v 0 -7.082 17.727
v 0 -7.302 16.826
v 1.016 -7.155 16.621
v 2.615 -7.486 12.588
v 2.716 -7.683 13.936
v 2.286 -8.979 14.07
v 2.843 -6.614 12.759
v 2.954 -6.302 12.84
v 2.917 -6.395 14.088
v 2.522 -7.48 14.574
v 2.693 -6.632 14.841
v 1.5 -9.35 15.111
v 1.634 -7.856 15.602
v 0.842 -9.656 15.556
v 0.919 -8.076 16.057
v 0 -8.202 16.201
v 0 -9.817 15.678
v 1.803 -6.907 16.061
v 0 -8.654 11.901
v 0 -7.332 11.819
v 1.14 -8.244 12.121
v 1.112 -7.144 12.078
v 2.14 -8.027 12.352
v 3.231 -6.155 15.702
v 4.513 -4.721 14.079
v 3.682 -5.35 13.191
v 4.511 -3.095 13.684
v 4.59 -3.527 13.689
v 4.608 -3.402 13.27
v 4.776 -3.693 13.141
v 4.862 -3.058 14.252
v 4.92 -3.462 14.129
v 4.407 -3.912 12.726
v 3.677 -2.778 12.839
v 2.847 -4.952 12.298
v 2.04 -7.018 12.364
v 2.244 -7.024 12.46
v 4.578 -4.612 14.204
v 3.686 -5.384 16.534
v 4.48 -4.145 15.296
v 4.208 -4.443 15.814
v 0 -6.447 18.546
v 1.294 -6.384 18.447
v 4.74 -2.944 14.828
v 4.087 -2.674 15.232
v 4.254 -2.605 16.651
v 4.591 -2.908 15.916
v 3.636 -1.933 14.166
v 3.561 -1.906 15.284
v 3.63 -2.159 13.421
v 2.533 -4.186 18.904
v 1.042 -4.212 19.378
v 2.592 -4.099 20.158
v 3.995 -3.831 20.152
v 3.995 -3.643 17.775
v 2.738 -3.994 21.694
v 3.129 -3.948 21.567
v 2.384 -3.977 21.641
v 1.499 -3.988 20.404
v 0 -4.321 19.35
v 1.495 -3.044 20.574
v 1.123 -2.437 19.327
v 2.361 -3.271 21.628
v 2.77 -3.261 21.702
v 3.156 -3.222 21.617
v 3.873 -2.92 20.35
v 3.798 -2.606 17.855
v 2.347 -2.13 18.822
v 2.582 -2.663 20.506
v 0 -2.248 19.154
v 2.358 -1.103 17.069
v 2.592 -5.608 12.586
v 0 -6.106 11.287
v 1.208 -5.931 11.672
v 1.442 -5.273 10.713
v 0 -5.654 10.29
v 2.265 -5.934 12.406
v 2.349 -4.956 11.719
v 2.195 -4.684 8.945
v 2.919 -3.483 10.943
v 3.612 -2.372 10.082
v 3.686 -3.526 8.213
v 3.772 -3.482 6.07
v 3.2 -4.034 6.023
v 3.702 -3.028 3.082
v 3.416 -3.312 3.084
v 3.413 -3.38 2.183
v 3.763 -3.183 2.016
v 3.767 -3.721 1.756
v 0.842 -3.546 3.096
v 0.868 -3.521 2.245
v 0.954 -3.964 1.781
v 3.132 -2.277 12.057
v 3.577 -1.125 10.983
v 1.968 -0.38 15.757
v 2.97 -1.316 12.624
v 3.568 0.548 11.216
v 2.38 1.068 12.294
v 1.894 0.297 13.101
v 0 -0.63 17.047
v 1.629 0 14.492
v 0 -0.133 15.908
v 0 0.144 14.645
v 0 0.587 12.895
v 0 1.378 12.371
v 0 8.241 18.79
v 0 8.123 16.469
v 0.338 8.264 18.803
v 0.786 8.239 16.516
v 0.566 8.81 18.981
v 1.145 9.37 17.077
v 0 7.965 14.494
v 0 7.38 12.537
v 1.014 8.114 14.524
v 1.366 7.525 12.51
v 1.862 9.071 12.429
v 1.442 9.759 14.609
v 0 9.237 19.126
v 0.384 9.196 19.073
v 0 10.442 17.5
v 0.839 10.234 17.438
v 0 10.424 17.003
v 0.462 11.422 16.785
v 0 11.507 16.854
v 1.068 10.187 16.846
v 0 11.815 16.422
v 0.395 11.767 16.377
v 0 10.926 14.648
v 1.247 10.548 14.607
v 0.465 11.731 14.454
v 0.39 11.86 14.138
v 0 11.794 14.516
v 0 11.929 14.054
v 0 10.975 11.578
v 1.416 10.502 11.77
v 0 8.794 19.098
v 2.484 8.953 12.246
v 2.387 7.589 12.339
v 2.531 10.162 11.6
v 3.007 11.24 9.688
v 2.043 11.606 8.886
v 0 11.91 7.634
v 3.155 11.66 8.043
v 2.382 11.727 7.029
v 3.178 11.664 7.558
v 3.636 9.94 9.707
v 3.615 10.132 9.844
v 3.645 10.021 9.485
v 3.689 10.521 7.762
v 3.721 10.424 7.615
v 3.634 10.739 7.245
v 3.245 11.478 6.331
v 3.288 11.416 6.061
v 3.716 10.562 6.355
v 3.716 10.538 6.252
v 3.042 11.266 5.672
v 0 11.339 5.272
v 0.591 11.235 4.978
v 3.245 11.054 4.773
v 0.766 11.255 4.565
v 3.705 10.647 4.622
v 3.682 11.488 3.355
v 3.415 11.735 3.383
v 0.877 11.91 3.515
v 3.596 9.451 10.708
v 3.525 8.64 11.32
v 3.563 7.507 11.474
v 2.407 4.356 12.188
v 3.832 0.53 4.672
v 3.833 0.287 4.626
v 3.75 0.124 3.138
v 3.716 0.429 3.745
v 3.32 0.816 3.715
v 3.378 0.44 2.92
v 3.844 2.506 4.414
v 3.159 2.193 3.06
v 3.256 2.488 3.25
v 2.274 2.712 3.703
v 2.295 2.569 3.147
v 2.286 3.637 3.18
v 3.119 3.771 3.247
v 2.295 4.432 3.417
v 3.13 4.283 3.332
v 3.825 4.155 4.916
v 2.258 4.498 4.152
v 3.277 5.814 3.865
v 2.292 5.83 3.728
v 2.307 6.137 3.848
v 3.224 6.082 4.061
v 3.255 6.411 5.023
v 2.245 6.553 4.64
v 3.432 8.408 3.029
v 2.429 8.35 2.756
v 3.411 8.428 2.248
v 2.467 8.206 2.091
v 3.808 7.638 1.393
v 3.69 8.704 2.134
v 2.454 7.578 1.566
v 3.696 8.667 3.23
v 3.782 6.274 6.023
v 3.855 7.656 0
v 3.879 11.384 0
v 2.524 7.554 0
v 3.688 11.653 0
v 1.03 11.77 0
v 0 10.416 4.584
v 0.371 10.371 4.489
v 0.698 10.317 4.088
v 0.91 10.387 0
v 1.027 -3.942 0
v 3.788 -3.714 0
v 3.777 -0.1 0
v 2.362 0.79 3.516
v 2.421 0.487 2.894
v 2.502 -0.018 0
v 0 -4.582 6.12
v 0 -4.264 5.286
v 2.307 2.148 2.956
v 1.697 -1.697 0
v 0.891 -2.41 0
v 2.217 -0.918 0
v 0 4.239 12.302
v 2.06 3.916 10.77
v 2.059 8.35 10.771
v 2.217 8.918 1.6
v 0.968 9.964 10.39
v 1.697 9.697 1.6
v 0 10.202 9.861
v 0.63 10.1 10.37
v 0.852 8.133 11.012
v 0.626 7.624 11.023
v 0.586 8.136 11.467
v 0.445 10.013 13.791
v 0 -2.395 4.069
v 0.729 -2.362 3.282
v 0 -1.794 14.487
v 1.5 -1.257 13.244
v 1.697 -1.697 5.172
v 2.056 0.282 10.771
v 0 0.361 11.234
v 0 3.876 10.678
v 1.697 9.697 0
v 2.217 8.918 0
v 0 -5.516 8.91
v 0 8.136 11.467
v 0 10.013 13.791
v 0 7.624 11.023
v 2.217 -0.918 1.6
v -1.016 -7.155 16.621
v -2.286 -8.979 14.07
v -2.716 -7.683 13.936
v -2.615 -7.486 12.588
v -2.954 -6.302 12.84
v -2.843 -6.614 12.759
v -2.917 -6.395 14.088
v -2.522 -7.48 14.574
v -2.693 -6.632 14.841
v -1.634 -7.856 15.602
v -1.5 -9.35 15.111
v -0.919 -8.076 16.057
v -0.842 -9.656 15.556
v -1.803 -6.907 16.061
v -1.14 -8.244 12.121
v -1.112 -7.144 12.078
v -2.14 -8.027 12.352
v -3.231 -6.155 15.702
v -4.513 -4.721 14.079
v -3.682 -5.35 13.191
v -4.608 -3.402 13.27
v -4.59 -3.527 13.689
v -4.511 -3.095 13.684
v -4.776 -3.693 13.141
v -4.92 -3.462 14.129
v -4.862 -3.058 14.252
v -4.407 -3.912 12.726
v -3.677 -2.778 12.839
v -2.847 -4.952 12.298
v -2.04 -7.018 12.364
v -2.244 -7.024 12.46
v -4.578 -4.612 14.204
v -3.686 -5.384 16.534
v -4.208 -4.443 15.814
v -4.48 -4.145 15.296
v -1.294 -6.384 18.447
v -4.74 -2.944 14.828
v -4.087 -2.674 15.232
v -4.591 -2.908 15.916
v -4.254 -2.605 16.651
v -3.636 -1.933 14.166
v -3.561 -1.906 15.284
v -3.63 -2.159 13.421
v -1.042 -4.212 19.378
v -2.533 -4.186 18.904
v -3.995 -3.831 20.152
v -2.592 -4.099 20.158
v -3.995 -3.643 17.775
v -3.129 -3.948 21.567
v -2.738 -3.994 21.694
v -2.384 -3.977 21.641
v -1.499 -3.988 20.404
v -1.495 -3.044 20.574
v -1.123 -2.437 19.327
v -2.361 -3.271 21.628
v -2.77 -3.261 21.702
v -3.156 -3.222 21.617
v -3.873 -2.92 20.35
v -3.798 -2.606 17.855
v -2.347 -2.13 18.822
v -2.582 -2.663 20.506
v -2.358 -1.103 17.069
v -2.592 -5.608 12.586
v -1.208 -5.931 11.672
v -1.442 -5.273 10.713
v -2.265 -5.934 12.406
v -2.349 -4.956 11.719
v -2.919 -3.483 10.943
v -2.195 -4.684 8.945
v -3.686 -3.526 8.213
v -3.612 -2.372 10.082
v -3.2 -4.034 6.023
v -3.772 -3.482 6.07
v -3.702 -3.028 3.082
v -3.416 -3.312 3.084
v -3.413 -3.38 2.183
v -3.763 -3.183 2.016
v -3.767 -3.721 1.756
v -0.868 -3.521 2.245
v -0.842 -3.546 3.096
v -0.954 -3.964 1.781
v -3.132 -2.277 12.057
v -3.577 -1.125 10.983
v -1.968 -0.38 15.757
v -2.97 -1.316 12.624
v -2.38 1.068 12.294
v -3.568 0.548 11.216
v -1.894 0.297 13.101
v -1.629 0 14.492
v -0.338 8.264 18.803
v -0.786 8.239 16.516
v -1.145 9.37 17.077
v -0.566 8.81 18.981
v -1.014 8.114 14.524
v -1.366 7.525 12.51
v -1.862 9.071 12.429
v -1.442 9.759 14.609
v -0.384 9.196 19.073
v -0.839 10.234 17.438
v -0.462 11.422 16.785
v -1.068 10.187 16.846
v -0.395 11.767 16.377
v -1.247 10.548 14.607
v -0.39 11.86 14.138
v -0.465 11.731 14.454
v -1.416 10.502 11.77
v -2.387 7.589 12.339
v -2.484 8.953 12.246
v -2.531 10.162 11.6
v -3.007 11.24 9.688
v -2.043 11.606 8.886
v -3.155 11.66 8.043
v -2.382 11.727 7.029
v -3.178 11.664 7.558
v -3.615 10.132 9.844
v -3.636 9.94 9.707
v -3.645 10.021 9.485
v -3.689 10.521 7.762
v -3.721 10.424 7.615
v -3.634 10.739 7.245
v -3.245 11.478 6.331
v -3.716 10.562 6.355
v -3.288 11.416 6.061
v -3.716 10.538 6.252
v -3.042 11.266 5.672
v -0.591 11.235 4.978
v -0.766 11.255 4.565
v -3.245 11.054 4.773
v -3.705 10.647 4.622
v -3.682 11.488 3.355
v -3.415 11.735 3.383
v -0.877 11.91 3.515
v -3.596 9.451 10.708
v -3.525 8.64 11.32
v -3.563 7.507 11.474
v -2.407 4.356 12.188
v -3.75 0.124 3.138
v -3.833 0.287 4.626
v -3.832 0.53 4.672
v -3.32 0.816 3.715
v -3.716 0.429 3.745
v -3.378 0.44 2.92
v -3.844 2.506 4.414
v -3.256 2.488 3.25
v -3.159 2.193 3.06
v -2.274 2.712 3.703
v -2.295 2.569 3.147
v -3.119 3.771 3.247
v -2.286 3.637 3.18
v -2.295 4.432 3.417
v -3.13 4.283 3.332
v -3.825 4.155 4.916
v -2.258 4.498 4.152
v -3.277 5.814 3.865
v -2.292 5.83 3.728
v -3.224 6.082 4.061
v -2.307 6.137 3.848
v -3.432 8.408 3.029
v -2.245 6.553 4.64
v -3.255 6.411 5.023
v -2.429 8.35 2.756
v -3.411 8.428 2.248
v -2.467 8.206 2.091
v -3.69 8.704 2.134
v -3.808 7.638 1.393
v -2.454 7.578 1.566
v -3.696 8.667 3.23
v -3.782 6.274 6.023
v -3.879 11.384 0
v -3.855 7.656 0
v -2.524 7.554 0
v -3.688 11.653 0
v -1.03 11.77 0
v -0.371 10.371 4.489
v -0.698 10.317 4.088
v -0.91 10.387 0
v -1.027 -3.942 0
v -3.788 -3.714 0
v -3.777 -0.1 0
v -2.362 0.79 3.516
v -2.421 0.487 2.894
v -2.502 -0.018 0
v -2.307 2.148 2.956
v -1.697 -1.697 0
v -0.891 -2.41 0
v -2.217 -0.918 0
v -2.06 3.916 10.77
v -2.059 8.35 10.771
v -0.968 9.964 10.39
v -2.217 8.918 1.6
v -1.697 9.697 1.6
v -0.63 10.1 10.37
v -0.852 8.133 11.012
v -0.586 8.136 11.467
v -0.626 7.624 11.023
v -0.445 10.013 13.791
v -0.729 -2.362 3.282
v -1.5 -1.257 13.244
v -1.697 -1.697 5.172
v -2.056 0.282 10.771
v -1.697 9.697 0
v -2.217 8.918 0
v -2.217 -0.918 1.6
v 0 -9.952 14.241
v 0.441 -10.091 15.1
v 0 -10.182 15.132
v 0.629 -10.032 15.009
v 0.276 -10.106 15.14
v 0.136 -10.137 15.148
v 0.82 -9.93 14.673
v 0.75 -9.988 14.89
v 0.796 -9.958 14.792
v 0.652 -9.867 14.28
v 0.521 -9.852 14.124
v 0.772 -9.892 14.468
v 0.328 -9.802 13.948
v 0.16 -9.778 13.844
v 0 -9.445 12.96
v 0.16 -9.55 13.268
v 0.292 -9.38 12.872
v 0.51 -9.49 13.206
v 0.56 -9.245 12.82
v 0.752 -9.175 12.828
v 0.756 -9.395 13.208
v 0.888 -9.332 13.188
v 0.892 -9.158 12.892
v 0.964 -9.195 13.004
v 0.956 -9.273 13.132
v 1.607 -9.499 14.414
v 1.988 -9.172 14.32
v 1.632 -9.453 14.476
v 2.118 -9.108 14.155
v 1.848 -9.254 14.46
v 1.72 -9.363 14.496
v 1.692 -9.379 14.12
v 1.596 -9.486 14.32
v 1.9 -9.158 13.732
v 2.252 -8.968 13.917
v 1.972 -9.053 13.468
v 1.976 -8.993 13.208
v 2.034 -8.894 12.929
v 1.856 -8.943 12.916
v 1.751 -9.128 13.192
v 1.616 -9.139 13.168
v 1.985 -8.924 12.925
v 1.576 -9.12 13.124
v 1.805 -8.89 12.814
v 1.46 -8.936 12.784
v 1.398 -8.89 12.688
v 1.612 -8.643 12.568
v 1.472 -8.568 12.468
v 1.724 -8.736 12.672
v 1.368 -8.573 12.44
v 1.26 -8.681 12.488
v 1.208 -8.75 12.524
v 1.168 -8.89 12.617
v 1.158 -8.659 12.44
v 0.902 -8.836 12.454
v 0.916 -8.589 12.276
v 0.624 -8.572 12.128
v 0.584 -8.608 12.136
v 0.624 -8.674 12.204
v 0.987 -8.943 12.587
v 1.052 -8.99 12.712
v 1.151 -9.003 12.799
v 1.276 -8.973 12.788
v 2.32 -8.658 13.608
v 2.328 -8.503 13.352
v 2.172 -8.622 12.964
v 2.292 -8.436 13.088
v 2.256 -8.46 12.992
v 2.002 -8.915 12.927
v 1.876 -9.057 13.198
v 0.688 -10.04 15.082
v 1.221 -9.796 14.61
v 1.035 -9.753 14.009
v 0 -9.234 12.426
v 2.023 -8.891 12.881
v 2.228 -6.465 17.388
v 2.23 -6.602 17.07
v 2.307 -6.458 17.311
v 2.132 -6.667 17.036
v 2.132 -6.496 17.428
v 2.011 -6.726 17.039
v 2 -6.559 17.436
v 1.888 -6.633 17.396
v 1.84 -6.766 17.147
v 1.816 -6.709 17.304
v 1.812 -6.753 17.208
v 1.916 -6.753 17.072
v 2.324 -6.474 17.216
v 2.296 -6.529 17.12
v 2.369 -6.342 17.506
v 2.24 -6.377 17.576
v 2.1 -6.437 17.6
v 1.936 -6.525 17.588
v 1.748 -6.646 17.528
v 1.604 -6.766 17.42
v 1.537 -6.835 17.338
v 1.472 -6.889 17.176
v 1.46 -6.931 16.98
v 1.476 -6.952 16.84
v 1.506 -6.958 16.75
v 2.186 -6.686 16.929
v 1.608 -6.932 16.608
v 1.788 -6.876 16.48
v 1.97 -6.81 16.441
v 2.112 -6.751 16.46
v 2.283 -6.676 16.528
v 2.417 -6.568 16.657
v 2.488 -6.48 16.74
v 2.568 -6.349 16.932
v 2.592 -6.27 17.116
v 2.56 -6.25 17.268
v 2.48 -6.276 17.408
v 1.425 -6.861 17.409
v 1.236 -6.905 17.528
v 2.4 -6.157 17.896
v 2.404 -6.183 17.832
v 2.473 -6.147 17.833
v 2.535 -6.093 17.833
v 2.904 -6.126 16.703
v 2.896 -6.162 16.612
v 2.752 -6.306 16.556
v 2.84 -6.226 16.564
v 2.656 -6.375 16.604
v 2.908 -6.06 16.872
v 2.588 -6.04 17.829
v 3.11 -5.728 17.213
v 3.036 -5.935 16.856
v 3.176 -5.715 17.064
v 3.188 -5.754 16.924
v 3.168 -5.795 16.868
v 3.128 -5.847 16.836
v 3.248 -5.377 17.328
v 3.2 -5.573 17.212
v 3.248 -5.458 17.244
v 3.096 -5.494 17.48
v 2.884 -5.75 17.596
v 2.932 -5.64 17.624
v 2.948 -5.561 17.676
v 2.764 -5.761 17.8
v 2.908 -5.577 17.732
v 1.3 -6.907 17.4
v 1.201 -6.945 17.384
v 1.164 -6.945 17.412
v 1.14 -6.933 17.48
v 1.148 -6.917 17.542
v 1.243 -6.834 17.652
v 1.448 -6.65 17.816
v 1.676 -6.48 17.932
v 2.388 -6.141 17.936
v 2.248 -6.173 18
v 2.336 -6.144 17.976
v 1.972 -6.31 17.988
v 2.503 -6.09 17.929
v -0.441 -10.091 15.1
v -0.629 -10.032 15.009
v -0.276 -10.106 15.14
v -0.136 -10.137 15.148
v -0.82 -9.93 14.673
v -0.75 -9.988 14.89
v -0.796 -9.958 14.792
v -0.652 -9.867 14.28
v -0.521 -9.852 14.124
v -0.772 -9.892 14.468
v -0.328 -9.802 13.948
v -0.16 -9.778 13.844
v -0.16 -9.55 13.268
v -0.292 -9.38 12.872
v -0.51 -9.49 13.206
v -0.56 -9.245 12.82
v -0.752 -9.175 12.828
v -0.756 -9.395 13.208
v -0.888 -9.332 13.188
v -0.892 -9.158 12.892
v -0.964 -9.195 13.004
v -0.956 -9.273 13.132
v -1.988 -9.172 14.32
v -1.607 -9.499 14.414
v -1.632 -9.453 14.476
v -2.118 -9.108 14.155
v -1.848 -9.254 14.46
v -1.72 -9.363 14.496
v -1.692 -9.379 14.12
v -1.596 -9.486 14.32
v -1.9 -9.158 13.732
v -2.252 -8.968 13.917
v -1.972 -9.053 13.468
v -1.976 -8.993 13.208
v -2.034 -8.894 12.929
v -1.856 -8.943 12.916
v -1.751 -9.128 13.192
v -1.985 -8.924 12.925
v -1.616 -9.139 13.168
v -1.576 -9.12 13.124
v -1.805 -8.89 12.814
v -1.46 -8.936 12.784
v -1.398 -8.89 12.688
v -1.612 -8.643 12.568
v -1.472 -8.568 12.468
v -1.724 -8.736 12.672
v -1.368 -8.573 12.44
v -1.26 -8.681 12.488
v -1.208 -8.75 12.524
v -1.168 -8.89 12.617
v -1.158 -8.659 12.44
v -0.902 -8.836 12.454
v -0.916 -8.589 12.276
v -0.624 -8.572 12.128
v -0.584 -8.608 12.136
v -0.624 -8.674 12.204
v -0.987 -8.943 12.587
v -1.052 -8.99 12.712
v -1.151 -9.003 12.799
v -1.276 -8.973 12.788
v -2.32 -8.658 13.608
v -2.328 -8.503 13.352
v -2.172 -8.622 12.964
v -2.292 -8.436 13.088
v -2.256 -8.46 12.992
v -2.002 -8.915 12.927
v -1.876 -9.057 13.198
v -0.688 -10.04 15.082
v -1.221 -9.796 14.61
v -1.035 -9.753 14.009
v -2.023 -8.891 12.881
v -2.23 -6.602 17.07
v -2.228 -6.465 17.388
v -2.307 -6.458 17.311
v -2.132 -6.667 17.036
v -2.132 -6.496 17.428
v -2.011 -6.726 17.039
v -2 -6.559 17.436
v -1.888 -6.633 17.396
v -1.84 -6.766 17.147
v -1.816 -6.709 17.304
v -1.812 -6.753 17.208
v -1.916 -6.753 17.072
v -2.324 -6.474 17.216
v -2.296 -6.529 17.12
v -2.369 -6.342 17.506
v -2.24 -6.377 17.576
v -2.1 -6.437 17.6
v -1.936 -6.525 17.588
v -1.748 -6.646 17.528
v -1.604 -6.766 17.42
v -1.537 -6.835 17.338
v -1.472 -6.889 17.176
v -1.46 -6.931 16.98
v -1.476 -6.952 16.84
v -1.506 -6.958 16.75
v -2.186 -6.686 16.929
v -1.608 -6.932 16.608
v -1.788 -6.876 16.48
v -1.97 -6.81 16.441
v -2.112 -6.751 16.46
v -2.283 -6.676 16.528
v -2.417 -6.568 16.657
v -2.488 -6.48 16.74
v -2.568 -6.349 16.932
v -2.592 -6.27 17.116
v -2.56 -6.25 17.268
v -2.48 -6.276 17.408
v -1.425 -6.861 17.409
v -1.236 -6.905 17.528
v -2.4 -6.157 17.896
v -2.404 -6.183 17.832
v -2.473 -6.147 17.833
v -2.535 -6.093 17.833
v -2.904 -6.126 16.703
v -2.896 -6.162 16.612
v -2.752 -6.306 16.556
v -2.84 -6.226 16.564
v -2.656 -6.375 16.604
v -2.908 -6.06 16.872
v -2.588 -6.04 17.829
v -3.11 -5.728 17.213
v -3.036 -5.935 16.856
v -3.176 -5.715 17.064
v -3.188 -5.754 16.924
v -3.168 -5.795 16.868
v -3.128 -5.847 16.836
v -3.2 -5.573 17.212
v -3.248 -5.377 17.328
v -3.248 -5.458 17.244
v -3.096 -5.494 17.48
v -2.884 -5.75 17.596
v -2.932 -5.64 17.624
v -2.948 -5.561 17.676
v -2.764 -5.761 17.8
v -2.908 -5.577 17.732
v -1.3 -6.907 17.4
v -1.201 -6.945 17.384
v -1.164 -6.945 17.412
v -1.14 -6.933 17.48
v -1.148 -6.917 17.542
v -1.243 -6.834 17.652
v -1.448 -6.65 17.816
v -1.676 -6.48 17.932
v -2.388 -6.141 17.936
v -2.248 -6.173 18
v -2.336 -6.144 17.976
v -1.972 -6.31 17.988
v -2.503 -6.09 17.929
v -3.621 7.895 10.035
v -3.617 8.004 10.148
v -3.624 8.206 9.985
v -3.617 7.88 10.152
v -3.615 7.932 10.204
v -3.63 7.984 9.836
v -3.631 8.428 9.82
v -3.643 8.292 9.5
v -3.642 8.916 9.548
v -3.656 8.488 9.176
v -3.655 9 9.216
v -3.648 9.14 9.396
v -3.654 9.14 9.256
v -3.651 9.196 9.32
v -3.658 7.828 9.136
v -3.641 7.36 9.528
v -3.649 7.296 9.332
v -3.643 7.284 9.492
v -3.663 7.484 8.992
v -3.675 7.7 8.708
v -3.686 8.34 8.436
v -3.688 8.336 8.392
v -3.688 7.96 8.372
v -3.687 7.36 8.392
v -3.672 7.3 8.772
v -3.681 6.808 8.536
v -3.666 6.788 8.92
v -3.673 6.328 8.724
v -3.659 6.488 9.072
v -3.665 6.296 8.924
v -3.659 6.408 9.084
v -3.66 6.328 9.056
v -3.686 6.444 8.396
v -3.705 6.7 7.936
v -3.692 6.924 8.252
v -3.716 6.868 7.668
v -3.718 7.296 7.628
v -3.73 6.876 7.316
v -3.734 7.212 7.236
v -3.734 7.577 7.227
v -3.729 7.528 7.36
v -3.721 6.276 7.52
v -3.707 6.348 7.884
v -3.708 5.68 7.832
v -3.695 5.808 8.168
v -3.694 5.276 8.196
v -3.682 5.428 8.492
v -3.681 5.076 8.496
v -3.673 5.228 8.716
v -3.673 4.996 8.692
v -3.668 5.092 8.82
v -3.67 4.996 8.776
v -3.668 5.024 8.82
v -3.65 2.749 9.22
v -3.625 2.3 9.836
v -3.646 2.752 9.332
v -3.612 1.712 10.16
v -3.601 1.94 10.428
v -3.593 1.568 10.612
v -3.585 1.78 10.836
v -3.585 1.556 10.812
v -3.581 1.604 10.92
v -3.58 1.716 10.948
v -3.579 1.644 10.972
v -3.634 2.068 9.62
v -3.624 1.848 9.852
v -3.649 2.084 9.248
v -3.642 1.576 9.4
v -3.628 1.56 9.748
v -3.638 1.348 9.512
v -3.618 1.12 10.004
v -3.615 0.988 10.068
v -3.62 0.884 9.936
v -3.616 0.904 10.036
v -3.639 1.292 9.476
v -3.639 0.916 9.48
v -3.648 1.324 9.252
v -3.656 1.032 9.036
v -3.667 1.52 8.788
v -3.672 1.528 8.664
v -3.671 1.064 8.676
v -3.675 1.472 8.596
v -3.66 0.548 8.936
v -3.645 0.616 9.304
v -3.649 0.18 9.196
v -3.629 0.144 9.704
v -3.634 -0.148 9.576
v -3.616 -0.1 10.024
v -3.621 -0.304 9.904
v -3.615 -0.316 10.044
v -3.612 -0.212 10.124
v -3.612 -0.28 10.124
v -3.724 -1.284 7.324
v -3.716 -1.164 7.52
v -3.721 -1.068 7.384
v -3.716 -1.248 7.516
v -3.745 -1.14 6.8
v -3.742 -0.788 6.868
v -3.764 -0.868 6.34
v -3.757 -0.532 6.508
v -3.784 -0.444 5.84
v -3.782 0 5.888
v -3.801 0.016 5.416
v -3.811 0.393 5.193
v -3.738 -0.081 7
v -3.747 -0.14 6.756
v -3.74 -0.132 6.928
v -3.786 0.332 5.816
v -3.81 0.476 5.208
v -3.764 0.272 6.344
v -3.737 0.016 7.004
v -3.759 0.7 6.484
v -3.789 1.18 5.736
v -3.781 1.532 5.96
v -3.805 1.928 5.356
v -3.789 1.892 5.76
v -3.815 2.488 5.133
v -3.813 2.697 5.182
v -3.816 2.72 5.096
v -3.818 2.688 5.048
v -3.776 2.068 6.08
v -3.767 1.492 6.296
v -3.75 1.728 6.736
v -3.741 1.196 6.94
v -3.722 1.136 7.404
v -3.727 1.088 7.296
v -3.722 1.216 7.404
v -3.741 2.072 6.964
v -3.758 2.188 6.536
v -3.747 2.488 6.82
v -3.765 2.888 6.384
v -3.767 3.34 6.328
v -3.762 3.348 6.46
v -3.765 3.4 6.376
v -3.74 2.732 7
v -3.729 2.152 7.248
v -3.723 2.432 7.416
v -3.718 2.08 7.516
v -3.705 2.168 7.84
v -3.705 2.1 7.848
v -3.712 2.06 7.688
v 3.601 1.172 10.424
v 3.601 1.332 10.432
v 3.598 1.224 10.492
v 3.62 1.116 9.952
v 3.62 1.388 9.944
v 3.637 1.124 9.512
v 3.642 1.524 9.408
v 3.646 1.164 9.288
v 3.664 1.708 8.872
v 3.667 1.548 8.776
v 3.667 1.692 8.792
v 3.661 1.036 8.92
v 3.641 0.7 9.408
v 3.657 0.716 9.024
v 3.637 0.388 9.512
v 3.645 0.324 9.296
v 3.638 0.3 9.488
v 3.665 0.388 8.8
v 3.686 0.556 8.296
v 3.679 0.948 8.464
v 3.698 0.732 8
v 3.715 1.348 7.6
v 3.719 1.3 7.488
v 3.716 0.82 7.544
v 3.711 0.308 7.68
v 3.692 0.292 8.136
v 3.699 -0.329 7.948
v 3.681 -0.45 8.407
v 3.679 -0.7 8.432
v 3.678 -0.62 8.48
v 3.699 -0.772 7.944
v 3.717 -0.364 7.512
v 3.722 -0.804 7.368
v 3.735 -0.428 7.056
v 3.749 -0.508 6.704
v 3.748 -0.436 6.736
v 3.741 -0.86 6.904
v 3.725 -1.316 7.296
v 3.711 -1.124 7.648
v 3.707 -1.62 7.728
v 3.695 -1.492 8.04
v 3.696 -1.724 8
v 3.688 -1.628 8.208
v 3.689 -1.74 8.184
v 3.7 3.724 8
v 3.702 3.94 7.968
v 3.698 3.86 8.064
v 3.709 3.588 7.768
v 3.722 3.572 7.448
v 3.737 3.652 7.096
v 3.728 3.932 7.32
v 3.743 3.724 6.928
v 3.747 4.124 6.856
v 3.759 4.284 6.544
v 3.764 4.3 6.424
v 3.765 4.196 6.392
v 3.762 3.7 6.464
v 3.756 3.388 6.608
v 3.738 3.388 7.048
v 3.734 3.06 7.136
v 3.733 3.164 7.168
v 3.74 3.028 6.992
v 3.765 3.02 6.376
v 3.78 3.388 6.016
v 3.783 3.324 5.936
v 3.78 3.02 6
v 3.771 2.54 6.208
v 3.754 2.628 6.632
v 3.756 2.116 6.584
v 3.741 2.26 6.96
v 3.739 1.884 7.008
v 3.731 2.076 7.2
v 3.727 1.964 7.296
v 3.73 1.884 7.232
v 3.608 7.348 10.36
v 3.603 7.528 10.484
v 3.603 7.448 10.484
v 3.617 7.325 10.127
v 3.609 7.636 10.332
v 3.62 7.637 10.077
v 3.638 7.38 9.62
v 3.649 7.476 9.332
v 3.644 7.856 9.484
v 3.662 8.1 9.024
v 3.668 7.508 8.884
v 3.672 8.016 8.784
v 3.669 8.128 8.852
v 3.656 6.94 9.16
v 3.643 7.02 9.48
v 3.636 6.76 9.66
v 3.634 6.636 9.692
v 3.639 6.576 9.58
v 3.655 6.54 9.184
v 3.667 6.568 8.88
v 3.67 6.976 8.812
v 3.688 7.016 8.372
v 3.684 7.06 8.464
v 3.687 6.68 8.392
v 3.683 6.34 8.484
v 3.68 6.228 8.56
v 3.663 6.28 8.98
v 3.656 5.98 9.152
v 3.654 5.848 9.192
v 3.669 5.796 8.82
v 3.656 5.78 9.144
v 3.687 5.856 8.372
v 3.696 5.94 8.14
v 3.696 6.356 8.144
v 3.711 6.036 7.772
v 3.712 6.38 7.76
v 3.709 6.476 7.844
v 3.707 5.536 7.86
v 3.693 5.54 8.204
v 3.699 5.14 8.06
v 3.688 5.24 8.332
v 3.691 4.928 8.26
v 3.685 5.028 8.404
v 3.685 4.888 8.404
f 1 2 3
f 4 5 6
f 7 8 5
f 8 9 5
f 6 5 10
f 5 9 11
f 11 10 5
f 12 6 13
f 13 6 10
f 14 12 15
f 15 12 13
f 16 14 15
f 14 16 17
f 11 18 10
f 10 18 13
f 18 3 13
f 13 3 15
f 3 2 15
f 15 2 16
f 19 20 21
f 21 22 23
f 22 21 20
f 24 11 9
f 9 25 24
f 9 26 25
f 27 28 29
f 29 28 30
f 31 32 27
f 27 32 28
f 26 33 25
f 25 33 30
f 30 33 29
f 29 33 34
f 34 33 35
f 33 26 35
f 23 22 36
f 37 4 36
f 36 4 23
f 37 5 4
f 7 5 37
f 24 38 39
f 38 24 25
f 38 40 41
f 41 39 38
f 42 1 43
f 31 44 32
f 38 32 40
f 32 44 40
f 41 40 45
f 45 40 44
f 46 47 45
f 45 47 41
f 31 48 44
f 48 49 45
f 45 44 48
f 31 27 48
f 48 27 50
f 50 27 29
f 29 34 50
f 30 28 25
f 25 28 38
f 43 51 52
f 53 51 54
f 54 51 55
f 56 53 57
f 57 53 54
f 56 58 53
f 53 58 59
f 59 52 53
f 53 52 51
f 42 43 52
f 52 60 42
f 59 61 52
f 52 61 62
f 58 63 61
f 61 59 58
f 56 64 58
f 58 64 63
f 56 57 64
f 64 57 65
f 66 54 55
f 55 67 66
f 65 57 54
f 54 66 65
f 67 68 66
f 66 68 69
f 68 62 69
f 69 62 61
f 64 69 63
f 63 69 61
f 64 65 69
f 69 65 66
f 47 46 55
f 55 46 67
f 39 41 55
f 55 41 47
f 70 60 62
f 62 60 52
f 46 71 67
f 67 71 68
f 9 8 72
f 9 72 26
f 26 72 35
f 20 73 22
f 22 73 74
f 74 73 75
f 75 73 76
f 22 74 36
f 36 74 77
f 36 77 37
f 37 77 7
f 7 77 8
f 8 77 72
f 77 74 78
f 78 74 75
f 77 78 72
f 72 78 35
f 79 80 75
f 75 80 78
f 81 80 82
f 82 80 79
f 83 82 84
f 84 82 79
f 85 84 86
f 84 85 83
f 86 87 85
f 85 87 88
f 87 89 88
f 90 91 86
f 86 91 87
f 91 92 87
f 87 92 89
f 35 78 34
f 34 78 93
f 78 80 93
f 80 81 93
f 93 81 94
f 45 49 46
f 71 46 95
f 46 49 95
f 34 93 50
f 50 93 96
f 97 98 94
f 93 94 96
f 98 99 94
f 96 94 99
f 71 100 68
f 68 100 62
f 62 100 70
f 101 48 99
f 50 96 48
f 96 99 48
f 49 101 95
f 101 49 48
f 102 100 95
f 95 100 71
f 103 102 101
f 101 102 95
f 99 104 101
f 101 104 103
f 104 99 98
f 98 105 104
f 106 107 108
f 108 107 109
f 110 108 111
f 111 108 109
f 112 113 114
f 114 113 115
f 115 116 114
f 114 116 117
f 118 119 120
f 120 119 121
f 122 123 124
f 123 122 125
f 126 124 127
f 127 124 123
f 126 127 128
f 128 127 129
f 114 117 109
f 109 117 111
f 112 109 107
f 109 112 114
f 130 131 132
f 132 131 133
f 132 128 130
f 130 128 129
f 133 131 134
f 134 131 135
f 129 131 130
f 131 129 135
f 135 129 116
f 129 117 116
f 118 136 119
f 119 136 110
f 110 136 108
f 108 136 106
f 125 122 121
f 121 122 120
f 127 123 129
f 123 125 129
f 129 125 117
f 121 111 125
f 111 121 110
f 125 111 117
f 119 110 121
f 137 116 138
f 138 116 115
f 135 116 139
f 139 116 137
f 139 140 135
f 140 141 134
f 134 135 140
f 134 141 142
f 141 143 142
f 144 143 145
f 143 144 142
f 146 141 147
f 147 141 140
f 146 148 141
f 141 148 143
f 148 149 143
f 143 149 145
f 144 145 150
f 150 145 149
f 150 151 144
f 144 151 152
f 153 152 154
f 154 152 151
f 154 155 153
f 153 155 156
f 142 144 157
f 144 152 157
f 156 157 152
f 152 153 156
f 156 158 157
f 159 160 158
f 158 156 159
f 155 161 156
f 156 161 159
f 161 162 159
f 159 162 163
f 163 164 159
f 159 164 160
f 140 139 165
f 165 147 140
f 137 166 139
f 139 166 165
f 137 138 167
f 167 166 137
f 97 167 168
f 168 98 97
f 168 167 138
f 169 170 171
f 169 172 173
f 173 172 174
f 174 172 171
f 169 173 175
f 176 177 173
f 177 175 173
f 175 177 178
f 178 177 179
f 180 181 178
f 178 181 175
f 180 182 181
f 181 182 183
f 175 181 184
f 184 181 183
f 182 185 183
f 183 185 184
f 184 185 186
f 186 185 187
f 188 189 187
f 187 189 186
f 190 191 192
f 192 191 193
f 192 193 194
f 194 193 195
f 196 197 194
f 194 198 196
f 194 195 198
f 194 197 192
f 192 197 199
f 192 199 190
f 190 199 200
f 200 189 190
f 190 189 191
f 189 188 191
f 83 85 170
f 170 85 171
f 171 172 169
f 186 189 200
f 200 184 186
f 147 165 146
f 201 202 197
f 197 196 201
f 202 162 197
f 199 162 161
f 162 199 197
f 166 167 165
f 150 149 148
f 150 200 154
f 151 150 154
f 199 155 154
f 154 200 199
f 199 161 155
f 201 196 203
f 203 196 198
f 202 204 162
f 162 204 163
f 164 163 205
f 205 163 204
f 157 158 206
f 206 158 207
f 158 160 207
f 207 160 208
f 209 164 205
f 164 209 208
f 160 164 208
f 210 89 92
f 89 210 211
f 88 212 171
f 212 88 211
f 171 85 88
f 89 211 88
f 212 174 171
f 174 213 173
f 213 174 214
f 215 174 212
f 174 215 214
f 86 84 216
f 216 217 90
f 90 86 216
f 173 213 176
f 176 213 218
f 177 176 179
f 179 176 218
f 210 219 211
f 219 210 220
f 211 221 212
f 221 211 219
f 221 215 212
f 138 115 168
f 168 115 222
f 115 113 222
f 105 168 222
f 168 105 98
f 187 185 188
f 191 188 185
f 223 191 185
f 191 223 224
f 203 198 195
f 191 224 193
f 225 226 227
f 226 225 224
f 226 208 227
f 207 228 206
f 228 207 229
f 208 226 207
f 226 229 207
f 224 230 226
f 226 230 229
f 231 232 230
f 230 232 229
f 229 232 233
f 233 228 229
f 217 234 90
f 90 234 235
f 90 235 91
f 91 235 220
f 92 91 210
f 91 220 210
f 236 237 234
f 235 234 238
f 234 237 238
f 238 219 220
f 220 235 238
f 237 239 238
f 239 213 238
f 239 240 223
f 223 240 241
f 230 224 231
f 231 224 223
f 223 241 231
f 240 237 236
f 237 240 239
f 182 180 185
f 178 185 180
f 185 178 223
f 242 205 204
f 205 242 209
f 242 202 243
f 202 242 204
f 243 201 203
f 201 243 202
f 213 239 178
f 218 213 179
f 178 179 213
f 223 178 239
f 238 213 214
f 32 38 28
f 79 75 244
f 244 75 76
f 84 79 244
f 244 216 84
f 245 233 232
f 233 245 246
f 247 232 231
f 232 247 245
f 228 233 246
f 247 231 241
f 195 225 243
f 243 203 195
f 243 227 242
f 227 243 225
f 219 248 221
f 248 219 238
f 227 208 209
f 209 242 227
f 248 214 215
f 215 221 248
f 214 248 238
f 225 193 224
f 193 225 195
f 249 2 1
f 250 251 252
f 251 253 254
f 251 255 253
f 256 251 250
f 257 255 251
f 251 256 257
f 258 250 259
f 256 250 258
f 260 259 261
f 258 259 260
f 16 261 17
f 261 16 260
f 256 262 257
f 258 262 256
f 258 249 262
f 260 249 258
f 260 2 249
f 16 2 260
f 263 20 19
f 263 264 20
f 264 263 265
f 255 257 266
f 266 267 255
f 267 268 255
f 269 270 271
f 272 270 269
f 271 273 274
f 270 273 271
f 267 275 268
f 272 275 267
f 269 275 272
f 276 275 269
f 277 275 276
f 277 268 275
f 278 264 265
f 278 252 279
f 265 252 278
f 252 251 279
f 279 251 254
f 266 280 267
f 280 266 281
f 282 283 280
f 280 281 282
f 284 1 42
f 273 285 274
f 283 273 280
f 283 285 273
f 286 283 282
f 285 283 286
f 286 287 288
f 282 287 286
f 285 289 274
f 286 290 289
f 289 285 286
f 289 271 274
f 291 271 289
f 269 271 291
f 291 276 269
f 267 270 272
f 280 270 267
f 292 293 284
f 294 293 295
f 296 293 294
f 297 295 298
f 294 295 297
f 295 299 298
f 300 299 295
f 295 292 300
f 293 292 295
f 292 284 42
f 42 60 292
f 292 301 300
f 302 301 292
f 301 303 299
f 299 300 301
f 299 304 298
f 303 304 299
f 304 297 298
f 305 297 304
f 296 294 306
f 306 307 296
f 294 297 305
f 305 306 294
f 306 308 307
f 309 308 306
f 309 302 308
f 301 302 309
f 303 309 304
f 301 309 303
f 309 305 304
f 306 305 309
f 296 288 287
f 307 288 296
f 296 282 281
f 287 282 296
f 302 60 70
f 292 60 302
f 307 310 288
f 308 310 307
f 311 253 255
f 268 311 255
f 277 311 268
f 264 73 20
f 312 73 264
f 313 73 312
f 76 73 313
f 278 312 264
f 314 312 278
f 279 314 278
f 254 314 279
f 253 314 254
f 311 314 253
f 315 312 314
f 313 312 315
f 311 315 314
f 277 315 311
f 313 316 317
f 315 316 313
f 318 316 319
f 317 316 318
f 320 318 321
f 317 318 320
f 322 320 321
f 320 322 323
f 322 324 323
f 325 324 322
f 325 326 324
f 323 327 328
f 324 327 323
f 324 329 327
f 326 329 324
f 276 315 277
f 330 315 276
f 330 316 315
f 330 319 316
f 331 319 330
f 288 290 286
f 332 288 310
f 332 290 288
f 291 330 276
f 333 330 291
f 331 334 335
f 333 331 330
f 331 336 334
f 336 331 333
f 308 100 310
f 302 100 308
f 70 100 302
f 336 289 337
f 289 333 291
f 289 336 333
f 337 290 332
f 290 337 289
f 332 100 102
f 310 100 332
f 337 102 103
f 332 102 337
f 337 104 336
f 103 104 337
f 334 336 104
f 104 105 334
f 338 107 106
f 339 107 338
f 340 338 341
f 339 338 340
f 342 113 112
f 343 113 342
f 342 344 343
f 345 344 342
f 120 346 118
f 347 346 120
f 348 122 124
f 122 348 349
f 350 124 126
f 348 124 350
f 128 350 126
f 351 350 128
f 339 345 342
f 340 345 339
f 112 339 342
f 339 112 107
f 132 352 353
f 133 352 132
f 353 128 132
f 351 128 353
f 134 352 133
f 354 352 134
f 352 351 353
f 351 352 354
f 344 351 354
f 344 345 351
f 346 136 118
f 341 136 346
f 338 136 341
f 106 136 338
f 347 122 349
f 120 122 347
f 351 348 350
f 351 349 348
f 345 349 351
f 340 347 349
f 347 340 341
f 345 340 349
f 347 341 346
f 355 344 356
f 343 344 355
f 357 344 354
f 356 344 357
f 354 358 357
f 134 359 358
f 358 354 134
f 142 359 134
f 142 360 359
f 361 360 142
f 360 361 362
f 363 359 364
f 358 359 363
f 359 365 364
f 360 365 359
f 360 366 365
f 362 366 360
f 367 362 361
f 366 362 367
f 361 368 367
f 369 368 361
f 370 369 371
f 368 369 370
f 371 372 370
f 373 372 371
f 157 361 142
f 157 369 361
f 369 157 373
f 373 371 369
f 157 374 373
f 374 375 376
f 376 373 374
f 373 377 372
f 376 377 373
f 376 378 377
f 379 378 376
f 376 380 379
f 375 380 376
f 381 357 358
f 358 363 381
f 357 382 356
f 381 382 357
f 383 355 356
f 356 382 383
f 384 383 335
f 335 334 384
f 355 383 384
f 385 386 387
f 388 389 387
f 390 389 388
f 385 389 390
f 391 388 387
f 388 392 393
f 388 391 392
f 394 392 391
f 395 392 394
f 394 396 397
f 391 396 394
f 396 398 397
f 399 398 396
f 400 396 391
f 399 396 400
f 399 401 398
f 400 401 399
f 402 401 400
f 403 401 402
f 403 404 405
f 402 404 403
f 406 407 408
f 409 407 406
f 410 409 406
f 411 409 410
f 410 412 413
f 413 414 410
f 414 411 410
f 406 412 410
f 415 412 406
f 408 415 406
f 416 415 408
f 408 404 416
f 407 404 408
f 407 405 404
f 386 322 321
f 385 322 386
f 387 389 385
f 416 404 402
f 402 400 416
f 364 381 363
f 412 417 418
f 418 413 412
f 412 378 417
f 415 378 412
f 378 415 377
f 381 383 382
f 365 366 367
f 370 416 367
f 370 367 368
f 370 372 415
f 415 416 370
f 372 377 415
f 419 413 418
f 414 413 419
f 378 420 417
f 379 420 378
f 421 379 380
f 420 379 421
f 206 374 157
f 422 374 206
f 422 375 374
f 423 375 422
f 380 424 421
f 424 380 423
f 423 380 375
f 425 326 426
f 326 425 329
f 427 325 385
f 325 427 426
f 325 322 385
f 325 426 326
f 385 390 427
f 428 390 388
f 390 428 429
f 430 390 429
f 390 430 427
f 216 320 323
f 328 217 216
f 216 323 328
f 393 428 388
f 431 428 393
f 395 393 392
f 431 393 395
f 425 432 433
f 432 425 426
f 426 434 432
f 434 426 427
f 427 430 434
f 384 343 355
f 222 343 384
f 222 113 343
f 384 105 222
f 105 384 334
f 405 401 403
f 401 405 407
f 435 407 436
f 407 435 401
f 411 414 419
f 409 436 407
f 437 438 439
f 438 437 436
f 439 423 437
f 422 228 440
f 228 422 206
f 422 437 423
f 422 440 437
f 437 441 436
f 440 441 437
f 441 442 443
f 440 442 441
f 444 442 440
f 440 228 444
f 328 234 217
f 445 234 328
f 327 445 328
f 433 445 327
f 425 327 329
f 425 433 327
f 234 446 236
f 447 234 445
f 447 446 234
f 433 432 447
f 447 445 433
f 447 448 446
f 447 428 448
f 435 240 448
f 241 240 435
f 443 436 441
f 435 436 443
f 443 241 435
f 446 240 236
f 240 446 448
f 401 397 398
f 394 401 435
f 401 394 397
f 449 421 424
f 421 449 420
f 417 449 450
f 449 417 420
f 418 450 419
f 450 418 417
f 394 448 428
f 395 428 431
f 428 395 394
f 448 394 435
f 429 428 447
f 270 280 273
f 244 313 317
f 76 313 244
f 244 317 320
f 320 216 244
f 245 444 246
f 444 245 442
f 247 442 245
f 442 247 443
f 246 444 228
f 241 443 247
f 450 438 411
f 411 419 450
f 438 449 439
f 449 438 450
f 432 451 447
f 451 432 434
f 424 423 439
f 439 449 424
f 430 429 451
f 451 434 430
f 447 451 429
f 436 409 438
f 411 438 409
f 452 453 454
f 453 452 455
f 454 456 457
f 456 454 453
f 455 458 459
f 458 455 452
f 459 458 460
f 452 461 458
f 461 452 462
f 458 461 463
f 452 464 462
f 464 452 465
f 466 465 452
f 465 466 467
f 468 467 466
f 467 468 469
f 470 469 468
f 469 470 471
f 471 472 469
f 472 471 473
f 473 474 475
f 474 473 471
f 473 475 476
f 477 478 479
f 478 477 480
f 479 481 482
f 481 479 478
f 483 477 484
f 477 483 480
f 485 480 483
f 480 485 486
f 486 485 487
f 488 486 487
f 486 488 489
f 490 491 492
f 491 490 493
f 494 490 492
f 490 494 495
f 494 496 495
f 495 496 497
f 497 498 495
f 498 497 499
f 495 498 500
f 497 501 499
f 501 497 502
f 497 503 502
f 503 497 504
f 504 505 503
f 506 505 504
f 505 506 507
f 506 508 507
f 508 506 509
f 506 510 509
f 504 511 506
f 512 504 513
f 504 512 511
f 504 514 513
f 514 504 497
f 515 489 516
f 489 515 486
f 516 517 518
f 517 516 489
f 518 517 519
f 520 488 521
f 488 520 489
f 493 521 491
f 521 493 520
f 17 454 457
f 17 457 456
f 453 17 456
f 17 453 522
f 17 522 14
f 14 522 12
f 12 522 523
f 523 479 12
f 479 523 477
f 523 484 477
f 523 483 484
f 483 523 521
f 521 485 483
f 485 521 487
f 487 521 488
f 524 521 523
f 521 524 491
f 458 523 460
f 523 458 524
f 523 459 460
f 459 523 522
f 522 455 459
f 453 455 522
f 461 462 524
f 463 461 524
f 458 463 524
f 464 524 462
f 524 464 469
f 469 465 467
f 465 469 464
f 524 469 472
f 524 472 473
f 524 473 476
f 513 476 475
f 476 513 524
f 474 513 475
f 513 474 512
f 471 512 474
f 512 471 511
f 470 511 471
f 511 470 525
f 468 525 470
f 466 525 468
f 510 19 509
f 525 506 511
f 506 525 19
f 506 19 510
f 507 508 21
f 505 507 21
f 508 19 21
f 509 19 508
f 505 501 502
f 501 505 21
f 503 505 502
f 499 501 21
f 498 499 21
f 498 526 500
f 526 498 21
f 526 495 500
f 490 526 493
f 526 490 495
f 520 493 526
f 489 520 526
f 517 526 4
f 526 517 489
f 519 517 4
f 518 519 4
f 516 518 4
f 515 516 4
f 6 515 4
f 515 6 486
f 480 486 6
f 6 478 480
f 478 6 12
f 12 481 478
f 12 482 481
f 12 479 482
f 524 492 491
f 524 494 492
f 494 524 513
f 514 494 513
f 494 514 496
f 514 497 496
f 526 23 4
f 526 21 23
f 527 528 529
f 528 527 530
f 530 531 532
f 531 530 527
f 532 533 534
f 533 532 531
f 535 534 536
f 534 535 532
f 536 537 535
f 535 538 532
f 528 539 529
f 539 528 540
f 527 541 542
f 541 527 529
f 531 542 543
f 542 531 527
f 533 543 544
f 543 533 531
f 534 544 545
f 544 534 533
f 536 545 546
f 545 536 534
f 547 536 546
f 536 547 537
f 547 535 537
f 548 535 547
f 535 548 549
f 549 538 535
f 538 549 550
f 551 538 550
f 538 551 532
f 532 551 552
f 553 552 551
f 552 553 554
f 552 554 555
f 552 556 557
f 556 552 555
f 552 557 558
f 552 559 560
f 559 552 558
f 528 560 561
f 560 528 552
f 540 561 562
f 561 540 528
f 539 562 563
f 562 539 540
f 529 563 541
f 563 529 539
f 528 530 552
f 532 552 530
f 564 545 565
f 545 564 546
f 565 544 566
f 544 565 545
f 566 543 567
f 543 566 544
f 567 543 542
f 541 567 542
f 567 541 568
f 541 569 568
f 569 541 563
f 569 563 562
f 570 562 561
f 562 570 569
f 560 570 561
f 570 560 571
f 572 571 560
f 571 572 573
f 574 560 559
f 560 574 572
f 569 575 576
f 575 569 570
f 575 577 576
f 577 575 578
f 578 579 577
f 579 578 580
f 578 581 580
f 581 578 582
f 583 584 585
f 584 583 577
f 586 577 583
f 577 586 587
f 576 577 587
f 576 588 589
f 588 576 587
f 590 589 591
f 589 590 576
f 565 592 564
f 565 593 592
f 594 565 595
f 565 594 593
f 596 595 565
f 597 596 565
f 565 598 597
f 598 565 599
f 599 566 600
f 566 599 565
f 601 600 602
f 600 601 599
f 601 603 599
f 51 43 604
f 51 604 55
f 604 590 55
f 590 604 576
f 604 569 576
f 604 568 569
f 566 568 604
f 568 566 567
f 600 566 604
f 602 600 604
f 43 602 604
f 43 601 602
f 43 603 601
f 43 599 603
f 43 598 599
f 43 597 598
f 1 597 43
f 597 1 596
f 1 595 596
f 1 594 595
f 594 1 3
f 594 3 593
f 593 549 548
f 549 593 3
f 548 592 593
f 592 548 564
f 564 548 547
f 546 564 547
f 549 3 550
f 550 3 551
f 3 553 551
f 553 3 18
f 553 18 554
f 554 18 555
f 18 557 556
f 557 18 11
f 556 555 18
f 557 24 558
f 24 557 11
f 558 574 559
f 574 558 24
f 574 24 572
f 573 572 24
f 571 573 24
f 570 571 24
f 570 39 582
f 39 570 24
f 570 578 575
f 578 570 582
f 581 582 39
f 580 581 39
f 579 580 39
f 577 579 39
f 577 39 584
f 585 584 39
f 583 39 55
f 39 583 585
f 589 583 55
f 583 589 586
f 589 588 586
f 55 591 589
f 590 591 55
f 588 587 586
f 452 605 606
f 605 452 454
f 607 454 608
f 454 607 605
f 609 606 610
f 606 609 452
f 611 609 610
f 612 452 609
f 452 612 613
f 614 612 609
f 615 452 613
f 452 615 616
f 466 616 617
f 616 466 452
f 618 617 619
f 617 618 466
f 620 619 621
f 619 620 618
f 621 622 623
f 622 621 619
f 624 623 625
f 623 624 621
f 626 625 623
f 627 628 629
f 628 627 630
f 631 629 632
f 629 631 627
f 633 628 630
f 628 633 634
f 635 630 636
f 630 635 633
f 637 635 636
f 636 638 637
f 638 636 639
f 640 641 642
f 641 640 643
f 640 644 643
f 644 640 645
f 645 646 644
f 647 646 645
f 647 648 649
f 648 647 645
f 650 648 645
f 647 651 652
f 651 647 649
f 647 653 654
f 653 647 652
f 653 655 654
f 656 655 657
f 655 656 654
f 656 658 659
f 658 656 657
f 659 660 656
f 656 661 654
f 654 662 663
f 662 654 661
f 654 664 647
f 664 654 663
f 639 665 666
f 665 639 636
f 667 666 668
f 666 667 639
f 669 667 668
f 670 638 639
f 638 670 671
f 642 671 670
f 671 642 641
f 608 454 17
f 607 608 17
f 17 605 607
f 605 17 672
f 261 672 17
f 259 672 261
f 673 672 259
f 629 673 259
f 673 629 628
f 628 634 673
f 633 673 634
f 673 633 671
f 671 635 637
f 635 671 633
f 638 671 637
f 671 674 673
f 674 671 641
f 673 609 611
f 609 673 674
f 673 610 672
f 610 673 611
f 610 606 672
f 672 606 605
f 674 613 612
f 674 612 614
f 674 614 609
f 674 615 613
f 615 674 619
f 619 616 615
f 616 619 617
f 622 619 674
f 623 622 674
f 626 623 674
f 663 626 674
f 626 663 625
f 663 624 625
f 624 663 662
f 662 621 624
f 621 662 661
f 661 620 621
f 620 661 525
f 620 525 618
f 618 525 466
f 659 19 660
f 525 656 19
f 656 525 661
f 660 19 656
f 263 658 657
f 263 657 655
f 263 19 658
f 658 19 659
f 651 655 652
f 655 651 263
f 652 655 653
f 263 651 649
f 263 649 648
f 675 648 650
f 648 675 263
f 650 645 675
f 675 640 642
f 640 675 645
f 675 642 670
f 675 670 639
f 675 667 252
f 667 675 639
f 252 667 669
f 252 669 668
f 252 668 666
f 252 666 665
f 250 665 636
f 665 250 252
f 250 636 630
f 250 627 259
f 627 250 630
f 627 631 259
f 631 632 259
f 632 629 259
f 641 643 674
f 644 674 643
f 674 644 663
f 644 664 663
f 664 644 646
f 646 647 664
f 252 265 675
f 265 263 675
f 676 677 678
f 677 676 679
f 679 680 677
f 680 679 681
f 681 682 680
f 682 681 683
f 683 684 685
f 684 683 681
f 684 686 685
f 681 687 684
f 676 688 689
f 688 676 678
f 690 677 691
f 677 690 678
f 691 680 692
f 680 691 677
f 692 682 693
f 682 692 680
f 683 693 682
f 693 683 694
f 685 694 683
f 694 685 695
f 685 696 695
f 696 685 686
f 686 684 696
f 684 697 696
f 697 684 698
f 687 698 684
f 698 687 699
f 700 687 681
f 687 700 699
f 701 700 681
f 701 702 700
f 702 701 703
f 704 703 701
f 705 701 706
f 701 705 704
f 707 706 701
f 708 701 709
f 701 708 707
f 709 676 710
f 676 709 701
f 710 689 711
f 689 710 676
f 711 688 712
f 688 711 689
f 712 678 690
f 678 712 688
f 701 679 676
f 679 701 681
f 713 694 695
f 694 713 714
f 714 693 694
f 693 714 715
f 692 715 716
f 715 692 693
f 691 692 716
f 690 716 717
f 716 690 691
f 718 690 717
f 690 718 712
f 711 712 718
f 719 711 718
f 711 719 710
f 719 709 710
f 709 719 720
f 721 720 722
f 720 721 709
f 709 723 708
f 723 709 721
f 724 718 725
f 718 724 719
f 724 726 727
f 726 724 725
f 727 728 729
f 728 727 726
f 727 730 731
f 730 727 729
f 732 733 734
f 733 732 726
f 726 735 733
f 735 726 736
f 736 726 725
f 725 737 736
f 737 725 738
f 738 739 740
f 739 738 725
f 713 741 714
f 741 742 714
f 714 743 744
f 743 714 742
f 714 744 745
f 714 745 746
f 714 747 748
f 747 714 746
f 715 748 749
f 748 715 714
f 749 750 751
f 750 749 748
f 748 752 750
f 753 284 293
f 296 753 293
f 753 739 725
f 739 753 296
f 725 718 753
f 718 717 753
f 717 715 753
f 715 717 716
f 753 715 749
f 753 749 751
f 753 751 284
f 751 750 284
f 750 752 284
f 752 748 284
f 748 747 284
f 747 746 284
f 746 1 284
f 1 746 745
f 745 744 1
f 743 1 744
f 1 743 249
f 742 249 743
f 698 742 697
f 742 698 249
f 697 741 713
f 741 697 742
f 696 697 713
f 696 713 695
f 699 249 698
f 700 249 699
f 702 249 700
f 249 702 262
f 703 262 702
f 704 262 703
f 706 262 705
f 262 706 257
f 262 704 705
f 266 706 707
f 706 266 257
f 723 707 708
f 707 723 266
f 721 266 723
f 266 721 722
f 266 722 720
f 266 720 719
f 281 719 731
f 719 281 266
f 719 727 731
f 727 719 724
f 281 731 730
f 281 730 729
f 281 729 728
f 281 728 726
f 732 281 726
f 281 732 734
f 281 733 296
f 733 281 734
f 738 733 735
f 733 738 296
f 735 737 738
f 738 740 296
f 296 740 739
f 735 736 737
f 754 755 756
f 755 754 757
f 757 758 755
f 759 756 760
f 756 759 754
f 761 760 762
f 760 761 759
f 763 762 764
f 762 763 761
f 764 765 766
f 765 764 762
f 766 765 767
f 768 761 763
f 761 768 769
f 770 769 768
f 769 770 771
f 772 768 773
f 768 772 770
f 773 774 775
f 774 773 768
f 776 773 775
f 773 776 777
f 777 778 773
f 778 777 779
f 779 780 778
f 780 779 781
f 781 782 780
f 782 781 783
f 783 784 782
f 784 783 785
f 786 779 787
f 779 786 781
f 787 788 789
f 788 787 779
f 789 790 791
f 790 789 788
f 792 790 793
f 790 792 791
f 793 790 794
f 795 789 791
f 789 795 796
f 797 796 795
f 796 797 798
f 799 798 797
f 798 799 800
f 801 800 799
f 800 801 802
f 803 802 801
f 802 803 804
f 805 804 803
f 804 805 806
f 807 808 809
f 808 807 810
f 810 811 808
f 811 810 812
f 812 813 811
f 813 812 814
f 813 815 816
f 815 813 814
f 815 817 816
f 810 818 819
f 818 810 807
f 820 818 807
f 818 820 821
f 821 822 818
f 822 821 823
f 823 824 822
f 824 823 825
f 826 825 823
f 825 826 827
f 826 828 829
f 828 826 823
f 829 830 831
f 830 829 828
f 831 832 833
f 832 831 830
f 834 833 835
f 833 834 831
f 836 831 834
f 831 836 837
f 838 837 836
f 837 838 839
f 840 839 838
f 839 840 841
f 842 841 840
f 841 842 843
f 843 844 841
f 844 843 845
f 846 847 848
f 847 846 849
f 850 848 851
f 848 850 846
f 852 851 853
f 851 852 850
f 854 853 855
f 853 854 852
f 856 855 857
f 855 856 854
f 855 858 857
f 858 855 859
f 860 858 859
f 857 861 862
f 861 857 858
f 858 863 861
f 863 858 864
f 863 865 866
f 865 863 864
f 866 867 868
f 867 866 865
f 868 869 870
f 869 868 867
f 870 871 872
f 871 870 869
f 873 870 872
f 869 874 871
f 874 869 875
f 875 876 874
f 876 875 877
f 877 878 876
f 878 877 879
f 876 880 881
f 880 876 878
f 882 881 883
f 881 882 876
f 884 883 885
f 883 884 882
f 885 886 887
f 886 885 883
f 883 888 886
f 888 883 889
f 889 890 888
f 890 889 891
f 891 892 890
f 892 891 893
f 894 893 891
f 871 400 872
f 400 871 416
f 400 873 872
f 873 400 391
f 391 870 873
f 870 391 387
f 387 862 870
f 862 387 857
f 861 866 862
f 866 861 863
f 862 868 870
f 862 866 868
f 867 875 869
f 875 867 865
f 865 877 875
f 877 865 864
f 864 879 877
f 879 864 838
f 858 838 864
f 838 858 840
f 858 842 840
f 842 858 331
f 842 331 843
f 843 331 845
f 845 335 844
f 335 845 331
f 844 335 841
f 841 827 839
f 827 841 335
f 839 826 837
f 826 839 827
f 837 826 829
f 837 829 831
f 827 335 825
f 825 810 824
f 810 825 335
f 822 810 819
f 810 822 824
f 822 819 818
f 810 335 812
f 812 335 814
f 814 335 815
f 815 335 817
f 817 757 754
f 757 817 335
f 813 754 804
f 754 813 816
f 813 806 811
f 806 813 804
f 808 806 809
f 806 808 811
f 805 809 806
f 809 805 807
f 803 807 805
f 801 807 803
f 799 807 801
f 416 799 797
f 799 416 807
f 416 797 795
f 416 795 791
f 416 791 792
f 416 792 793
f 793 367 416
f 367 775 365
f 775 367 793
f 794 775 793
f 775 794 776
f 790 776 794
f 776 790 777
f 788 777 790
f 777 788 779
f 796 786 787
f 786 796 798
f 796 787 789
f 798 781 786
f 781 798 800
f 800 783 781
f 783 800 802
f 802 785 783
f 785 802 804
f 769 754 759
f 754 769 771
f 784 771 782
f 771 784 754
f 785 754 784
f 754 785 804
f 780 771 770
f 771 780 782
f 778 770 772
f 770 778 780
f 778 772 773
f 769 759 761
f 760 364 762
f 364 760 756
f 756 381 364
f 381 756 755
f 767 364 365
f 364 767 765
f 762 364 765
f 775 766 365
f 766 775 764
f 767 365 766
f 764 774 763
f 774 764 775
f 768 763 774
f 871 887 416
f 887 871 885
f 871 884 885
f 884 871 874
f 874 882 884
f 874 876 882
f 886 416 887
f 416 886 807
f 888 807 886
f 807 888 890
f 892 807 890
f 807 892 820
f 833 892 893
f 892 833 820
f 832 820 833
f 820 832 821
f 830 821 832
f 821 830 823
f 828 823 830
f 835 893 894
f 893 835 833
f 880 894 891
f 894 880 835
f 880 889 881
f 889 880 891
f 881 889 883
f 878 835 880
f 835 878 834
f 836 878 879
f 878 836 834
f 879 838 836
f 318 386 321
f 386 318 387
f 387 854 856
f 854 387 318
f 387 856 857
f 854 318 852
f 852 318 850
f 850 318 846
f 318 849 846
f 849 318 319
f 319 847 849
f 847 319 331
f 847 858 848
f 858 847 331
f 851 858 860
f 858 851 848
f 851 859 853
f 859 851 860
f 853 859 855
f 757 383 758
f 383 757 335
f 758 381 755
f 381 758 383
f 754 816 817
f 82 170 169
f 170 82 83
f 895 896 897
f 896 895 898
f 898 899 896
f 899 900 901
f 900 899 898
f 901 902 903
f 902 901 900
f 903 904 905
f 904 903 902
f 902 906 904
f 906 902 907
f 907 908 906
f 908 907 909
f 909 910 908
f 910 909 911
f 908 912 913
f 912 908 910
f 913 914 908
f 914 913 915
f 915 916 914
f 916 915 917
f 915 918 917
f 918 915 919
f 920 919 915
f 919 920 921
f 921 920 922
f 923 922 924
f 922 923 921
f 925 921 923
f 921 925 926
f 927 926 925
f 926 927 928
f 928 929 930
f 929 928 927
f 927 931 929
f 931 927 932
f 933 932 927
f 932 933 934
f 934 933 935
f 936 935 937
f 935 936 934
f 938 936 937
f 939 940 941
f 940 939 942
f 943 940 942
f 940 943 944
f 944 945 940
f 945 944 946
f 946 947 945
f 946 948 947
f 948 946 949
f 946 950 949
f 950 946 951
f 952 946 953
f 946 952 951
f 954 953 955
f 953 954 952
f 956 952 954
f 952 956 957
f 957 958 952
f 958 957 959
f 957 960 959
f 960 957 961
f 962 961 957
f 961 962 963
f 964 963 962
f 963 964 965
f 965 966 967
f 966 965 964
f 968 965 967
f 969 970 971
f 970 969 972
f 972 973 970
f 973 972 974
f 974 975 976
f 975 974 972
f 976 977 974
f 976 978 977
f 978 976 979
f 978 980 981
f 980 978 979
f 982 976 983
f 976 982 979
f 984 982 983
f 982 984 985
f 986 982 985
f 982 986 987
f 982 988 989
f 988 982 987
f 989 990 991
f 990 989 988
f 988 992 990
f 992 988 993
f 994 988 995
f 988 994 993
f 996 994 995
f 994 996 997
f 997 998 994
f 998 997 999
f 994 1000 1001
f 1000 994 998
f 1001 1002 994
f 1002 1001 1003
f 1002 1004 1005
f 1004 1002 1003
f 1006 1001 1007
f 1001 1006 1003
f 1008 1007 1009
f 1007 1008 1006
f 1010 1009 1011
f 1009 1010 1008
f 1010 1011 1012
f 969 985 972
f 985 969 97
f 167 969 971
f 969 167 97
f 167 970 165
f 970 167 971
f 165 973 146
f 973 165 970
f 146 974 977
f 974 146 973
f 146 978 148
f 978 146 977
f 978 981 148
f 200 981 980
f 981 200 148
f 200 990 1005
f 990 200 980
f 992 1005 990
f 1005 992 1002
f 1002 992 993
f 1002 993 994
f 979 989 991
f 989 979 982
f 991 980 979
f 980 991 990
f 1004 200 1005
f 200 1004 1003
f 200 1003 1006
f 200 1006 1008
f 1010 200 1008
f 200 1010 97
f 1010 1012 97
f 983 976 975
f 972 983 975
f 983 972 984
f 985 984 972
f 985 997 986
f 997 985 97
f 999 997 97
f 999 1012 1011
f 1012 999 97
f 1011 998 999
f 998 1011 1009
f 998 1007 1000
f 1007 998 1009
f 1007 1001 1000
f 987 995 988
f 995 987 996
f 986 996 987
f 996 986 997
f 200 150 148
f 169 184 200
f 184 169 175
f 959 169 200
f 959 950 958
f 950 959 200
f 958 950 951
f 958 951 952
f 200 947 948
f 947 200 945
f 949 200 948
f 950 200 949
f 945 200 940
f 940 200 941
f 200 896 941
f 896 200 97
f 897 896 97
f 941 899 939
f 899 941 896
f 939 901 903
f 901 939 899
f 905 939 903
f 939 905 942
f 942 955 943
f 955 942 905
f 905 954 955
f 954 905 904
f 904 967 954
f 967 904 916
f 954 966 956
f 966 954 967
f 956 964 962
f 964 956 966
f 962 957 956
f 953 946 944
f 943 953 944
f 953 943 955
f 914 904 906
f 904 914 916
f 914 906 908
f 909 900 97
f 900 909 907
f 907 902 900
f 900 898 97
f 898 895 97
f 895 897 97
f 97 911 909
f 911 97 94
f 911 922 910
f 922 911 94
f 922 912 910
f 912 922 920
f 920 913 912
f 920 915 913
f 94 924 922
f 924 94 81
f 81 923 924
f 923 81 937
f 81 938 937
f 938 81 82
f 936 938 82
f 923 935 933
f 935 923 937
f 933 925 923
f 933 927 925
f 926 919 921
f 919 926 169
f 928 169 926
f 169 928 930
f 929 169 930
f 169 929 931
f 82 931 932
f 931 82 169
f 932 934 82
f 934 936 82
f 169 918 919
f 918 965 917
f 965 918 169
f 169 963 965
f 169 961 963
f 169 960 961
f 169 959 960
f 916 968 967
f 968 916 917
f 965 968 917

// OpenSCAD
use <../lib.scad>
use <s/26078p01s01.scad>
use <s/26078p01s02.scad>
use <s/26078s01.scad>
function ldraw_lib__26078p01() = [
// 0 Animal Dog Terrier with Black Eyes and Nose and Light Bluish Grey Fur Lines Pattern
// 0 Name: 26078p01.dat
// 0 Author: Philippe Hurbain [Philo]
// 0 !LDRAW_ORG Part UPDATE 2024-09
// 0 !LICENSE Licensed under CC BY 4.0 : see CAreadme.txt
// 
// 0 BFC CERTIFY CCW
  [0,"BFC","CERTIFY"],
  [0,"BFC","CCW"],
// 
// 0 !KEYWORDS Bricklink 26078pb002, CMF, Dorothy Gale, Rebrickable 26078pr0002
// 0 !KEYWORDS Set 71023, The LEGO Movie 2, Toto, Wizard of Oz
// 
// 0 !HISTORY 2016-10-05 {LEGO Digital Designer} Original part shape
// 0 !HISTORY 2021-07-04 [Philo] File preparation for LDraw Parts Tracker
// 0 !HISTORY 2024-10-27 [OrionP] Official Update 2024-09
// 
// 
// 1 16 0 0 0 1 0 0 0 1 0 0 0 1 s\26078s01.dat
  [1,16,0,0,0,1,0,0,0,1,0,0,0,1, ldraw_lib__s__26078s01()],
// 1 16 0 0 0 -1 0 0 0 1 0 0 0 1 s\26078s01.dat
  [1,16,0,0,0,-1,0,0,0,1,0,0,0,1, ldraw_lib__s__26078s01()],
// 1 16 0 0 0 1 0 0 0 1 0 0 0 1 s\26078p01s01.dat
  [1,16,0,0,0,1,0,0,0,1,0,0,0,1, ldraw_lib__s__26078p01s01()],
// 1 16 0 0 0 -1 0 0 0 1 0 0 0 1 s\26078p01s01.dat
  [1,16,0,0,0,-1,0,0,0,1,0,0,0,1, ldraw_lib__s__26078p01s01()],
// 1 16 0 0 0 1 0 0 0 1 0 0 0 1 s\26078p01s02.dat
  [1,16,0,0,0,1,0,0,0,1,0,0,0,1, ldraw_lib__s__26078p01s02()],
];
module ldraw_lib__26078p01(step=0, col=false, unit=2/5, alt=false, line=0.2, solid=!$preview)
    makepoly(ldraw_lib__26078p01(), step=step, col=col, unit=unit, alt=alt, line=line, solid=solid);
ldraw_lib__26078p01(line=0.2);
